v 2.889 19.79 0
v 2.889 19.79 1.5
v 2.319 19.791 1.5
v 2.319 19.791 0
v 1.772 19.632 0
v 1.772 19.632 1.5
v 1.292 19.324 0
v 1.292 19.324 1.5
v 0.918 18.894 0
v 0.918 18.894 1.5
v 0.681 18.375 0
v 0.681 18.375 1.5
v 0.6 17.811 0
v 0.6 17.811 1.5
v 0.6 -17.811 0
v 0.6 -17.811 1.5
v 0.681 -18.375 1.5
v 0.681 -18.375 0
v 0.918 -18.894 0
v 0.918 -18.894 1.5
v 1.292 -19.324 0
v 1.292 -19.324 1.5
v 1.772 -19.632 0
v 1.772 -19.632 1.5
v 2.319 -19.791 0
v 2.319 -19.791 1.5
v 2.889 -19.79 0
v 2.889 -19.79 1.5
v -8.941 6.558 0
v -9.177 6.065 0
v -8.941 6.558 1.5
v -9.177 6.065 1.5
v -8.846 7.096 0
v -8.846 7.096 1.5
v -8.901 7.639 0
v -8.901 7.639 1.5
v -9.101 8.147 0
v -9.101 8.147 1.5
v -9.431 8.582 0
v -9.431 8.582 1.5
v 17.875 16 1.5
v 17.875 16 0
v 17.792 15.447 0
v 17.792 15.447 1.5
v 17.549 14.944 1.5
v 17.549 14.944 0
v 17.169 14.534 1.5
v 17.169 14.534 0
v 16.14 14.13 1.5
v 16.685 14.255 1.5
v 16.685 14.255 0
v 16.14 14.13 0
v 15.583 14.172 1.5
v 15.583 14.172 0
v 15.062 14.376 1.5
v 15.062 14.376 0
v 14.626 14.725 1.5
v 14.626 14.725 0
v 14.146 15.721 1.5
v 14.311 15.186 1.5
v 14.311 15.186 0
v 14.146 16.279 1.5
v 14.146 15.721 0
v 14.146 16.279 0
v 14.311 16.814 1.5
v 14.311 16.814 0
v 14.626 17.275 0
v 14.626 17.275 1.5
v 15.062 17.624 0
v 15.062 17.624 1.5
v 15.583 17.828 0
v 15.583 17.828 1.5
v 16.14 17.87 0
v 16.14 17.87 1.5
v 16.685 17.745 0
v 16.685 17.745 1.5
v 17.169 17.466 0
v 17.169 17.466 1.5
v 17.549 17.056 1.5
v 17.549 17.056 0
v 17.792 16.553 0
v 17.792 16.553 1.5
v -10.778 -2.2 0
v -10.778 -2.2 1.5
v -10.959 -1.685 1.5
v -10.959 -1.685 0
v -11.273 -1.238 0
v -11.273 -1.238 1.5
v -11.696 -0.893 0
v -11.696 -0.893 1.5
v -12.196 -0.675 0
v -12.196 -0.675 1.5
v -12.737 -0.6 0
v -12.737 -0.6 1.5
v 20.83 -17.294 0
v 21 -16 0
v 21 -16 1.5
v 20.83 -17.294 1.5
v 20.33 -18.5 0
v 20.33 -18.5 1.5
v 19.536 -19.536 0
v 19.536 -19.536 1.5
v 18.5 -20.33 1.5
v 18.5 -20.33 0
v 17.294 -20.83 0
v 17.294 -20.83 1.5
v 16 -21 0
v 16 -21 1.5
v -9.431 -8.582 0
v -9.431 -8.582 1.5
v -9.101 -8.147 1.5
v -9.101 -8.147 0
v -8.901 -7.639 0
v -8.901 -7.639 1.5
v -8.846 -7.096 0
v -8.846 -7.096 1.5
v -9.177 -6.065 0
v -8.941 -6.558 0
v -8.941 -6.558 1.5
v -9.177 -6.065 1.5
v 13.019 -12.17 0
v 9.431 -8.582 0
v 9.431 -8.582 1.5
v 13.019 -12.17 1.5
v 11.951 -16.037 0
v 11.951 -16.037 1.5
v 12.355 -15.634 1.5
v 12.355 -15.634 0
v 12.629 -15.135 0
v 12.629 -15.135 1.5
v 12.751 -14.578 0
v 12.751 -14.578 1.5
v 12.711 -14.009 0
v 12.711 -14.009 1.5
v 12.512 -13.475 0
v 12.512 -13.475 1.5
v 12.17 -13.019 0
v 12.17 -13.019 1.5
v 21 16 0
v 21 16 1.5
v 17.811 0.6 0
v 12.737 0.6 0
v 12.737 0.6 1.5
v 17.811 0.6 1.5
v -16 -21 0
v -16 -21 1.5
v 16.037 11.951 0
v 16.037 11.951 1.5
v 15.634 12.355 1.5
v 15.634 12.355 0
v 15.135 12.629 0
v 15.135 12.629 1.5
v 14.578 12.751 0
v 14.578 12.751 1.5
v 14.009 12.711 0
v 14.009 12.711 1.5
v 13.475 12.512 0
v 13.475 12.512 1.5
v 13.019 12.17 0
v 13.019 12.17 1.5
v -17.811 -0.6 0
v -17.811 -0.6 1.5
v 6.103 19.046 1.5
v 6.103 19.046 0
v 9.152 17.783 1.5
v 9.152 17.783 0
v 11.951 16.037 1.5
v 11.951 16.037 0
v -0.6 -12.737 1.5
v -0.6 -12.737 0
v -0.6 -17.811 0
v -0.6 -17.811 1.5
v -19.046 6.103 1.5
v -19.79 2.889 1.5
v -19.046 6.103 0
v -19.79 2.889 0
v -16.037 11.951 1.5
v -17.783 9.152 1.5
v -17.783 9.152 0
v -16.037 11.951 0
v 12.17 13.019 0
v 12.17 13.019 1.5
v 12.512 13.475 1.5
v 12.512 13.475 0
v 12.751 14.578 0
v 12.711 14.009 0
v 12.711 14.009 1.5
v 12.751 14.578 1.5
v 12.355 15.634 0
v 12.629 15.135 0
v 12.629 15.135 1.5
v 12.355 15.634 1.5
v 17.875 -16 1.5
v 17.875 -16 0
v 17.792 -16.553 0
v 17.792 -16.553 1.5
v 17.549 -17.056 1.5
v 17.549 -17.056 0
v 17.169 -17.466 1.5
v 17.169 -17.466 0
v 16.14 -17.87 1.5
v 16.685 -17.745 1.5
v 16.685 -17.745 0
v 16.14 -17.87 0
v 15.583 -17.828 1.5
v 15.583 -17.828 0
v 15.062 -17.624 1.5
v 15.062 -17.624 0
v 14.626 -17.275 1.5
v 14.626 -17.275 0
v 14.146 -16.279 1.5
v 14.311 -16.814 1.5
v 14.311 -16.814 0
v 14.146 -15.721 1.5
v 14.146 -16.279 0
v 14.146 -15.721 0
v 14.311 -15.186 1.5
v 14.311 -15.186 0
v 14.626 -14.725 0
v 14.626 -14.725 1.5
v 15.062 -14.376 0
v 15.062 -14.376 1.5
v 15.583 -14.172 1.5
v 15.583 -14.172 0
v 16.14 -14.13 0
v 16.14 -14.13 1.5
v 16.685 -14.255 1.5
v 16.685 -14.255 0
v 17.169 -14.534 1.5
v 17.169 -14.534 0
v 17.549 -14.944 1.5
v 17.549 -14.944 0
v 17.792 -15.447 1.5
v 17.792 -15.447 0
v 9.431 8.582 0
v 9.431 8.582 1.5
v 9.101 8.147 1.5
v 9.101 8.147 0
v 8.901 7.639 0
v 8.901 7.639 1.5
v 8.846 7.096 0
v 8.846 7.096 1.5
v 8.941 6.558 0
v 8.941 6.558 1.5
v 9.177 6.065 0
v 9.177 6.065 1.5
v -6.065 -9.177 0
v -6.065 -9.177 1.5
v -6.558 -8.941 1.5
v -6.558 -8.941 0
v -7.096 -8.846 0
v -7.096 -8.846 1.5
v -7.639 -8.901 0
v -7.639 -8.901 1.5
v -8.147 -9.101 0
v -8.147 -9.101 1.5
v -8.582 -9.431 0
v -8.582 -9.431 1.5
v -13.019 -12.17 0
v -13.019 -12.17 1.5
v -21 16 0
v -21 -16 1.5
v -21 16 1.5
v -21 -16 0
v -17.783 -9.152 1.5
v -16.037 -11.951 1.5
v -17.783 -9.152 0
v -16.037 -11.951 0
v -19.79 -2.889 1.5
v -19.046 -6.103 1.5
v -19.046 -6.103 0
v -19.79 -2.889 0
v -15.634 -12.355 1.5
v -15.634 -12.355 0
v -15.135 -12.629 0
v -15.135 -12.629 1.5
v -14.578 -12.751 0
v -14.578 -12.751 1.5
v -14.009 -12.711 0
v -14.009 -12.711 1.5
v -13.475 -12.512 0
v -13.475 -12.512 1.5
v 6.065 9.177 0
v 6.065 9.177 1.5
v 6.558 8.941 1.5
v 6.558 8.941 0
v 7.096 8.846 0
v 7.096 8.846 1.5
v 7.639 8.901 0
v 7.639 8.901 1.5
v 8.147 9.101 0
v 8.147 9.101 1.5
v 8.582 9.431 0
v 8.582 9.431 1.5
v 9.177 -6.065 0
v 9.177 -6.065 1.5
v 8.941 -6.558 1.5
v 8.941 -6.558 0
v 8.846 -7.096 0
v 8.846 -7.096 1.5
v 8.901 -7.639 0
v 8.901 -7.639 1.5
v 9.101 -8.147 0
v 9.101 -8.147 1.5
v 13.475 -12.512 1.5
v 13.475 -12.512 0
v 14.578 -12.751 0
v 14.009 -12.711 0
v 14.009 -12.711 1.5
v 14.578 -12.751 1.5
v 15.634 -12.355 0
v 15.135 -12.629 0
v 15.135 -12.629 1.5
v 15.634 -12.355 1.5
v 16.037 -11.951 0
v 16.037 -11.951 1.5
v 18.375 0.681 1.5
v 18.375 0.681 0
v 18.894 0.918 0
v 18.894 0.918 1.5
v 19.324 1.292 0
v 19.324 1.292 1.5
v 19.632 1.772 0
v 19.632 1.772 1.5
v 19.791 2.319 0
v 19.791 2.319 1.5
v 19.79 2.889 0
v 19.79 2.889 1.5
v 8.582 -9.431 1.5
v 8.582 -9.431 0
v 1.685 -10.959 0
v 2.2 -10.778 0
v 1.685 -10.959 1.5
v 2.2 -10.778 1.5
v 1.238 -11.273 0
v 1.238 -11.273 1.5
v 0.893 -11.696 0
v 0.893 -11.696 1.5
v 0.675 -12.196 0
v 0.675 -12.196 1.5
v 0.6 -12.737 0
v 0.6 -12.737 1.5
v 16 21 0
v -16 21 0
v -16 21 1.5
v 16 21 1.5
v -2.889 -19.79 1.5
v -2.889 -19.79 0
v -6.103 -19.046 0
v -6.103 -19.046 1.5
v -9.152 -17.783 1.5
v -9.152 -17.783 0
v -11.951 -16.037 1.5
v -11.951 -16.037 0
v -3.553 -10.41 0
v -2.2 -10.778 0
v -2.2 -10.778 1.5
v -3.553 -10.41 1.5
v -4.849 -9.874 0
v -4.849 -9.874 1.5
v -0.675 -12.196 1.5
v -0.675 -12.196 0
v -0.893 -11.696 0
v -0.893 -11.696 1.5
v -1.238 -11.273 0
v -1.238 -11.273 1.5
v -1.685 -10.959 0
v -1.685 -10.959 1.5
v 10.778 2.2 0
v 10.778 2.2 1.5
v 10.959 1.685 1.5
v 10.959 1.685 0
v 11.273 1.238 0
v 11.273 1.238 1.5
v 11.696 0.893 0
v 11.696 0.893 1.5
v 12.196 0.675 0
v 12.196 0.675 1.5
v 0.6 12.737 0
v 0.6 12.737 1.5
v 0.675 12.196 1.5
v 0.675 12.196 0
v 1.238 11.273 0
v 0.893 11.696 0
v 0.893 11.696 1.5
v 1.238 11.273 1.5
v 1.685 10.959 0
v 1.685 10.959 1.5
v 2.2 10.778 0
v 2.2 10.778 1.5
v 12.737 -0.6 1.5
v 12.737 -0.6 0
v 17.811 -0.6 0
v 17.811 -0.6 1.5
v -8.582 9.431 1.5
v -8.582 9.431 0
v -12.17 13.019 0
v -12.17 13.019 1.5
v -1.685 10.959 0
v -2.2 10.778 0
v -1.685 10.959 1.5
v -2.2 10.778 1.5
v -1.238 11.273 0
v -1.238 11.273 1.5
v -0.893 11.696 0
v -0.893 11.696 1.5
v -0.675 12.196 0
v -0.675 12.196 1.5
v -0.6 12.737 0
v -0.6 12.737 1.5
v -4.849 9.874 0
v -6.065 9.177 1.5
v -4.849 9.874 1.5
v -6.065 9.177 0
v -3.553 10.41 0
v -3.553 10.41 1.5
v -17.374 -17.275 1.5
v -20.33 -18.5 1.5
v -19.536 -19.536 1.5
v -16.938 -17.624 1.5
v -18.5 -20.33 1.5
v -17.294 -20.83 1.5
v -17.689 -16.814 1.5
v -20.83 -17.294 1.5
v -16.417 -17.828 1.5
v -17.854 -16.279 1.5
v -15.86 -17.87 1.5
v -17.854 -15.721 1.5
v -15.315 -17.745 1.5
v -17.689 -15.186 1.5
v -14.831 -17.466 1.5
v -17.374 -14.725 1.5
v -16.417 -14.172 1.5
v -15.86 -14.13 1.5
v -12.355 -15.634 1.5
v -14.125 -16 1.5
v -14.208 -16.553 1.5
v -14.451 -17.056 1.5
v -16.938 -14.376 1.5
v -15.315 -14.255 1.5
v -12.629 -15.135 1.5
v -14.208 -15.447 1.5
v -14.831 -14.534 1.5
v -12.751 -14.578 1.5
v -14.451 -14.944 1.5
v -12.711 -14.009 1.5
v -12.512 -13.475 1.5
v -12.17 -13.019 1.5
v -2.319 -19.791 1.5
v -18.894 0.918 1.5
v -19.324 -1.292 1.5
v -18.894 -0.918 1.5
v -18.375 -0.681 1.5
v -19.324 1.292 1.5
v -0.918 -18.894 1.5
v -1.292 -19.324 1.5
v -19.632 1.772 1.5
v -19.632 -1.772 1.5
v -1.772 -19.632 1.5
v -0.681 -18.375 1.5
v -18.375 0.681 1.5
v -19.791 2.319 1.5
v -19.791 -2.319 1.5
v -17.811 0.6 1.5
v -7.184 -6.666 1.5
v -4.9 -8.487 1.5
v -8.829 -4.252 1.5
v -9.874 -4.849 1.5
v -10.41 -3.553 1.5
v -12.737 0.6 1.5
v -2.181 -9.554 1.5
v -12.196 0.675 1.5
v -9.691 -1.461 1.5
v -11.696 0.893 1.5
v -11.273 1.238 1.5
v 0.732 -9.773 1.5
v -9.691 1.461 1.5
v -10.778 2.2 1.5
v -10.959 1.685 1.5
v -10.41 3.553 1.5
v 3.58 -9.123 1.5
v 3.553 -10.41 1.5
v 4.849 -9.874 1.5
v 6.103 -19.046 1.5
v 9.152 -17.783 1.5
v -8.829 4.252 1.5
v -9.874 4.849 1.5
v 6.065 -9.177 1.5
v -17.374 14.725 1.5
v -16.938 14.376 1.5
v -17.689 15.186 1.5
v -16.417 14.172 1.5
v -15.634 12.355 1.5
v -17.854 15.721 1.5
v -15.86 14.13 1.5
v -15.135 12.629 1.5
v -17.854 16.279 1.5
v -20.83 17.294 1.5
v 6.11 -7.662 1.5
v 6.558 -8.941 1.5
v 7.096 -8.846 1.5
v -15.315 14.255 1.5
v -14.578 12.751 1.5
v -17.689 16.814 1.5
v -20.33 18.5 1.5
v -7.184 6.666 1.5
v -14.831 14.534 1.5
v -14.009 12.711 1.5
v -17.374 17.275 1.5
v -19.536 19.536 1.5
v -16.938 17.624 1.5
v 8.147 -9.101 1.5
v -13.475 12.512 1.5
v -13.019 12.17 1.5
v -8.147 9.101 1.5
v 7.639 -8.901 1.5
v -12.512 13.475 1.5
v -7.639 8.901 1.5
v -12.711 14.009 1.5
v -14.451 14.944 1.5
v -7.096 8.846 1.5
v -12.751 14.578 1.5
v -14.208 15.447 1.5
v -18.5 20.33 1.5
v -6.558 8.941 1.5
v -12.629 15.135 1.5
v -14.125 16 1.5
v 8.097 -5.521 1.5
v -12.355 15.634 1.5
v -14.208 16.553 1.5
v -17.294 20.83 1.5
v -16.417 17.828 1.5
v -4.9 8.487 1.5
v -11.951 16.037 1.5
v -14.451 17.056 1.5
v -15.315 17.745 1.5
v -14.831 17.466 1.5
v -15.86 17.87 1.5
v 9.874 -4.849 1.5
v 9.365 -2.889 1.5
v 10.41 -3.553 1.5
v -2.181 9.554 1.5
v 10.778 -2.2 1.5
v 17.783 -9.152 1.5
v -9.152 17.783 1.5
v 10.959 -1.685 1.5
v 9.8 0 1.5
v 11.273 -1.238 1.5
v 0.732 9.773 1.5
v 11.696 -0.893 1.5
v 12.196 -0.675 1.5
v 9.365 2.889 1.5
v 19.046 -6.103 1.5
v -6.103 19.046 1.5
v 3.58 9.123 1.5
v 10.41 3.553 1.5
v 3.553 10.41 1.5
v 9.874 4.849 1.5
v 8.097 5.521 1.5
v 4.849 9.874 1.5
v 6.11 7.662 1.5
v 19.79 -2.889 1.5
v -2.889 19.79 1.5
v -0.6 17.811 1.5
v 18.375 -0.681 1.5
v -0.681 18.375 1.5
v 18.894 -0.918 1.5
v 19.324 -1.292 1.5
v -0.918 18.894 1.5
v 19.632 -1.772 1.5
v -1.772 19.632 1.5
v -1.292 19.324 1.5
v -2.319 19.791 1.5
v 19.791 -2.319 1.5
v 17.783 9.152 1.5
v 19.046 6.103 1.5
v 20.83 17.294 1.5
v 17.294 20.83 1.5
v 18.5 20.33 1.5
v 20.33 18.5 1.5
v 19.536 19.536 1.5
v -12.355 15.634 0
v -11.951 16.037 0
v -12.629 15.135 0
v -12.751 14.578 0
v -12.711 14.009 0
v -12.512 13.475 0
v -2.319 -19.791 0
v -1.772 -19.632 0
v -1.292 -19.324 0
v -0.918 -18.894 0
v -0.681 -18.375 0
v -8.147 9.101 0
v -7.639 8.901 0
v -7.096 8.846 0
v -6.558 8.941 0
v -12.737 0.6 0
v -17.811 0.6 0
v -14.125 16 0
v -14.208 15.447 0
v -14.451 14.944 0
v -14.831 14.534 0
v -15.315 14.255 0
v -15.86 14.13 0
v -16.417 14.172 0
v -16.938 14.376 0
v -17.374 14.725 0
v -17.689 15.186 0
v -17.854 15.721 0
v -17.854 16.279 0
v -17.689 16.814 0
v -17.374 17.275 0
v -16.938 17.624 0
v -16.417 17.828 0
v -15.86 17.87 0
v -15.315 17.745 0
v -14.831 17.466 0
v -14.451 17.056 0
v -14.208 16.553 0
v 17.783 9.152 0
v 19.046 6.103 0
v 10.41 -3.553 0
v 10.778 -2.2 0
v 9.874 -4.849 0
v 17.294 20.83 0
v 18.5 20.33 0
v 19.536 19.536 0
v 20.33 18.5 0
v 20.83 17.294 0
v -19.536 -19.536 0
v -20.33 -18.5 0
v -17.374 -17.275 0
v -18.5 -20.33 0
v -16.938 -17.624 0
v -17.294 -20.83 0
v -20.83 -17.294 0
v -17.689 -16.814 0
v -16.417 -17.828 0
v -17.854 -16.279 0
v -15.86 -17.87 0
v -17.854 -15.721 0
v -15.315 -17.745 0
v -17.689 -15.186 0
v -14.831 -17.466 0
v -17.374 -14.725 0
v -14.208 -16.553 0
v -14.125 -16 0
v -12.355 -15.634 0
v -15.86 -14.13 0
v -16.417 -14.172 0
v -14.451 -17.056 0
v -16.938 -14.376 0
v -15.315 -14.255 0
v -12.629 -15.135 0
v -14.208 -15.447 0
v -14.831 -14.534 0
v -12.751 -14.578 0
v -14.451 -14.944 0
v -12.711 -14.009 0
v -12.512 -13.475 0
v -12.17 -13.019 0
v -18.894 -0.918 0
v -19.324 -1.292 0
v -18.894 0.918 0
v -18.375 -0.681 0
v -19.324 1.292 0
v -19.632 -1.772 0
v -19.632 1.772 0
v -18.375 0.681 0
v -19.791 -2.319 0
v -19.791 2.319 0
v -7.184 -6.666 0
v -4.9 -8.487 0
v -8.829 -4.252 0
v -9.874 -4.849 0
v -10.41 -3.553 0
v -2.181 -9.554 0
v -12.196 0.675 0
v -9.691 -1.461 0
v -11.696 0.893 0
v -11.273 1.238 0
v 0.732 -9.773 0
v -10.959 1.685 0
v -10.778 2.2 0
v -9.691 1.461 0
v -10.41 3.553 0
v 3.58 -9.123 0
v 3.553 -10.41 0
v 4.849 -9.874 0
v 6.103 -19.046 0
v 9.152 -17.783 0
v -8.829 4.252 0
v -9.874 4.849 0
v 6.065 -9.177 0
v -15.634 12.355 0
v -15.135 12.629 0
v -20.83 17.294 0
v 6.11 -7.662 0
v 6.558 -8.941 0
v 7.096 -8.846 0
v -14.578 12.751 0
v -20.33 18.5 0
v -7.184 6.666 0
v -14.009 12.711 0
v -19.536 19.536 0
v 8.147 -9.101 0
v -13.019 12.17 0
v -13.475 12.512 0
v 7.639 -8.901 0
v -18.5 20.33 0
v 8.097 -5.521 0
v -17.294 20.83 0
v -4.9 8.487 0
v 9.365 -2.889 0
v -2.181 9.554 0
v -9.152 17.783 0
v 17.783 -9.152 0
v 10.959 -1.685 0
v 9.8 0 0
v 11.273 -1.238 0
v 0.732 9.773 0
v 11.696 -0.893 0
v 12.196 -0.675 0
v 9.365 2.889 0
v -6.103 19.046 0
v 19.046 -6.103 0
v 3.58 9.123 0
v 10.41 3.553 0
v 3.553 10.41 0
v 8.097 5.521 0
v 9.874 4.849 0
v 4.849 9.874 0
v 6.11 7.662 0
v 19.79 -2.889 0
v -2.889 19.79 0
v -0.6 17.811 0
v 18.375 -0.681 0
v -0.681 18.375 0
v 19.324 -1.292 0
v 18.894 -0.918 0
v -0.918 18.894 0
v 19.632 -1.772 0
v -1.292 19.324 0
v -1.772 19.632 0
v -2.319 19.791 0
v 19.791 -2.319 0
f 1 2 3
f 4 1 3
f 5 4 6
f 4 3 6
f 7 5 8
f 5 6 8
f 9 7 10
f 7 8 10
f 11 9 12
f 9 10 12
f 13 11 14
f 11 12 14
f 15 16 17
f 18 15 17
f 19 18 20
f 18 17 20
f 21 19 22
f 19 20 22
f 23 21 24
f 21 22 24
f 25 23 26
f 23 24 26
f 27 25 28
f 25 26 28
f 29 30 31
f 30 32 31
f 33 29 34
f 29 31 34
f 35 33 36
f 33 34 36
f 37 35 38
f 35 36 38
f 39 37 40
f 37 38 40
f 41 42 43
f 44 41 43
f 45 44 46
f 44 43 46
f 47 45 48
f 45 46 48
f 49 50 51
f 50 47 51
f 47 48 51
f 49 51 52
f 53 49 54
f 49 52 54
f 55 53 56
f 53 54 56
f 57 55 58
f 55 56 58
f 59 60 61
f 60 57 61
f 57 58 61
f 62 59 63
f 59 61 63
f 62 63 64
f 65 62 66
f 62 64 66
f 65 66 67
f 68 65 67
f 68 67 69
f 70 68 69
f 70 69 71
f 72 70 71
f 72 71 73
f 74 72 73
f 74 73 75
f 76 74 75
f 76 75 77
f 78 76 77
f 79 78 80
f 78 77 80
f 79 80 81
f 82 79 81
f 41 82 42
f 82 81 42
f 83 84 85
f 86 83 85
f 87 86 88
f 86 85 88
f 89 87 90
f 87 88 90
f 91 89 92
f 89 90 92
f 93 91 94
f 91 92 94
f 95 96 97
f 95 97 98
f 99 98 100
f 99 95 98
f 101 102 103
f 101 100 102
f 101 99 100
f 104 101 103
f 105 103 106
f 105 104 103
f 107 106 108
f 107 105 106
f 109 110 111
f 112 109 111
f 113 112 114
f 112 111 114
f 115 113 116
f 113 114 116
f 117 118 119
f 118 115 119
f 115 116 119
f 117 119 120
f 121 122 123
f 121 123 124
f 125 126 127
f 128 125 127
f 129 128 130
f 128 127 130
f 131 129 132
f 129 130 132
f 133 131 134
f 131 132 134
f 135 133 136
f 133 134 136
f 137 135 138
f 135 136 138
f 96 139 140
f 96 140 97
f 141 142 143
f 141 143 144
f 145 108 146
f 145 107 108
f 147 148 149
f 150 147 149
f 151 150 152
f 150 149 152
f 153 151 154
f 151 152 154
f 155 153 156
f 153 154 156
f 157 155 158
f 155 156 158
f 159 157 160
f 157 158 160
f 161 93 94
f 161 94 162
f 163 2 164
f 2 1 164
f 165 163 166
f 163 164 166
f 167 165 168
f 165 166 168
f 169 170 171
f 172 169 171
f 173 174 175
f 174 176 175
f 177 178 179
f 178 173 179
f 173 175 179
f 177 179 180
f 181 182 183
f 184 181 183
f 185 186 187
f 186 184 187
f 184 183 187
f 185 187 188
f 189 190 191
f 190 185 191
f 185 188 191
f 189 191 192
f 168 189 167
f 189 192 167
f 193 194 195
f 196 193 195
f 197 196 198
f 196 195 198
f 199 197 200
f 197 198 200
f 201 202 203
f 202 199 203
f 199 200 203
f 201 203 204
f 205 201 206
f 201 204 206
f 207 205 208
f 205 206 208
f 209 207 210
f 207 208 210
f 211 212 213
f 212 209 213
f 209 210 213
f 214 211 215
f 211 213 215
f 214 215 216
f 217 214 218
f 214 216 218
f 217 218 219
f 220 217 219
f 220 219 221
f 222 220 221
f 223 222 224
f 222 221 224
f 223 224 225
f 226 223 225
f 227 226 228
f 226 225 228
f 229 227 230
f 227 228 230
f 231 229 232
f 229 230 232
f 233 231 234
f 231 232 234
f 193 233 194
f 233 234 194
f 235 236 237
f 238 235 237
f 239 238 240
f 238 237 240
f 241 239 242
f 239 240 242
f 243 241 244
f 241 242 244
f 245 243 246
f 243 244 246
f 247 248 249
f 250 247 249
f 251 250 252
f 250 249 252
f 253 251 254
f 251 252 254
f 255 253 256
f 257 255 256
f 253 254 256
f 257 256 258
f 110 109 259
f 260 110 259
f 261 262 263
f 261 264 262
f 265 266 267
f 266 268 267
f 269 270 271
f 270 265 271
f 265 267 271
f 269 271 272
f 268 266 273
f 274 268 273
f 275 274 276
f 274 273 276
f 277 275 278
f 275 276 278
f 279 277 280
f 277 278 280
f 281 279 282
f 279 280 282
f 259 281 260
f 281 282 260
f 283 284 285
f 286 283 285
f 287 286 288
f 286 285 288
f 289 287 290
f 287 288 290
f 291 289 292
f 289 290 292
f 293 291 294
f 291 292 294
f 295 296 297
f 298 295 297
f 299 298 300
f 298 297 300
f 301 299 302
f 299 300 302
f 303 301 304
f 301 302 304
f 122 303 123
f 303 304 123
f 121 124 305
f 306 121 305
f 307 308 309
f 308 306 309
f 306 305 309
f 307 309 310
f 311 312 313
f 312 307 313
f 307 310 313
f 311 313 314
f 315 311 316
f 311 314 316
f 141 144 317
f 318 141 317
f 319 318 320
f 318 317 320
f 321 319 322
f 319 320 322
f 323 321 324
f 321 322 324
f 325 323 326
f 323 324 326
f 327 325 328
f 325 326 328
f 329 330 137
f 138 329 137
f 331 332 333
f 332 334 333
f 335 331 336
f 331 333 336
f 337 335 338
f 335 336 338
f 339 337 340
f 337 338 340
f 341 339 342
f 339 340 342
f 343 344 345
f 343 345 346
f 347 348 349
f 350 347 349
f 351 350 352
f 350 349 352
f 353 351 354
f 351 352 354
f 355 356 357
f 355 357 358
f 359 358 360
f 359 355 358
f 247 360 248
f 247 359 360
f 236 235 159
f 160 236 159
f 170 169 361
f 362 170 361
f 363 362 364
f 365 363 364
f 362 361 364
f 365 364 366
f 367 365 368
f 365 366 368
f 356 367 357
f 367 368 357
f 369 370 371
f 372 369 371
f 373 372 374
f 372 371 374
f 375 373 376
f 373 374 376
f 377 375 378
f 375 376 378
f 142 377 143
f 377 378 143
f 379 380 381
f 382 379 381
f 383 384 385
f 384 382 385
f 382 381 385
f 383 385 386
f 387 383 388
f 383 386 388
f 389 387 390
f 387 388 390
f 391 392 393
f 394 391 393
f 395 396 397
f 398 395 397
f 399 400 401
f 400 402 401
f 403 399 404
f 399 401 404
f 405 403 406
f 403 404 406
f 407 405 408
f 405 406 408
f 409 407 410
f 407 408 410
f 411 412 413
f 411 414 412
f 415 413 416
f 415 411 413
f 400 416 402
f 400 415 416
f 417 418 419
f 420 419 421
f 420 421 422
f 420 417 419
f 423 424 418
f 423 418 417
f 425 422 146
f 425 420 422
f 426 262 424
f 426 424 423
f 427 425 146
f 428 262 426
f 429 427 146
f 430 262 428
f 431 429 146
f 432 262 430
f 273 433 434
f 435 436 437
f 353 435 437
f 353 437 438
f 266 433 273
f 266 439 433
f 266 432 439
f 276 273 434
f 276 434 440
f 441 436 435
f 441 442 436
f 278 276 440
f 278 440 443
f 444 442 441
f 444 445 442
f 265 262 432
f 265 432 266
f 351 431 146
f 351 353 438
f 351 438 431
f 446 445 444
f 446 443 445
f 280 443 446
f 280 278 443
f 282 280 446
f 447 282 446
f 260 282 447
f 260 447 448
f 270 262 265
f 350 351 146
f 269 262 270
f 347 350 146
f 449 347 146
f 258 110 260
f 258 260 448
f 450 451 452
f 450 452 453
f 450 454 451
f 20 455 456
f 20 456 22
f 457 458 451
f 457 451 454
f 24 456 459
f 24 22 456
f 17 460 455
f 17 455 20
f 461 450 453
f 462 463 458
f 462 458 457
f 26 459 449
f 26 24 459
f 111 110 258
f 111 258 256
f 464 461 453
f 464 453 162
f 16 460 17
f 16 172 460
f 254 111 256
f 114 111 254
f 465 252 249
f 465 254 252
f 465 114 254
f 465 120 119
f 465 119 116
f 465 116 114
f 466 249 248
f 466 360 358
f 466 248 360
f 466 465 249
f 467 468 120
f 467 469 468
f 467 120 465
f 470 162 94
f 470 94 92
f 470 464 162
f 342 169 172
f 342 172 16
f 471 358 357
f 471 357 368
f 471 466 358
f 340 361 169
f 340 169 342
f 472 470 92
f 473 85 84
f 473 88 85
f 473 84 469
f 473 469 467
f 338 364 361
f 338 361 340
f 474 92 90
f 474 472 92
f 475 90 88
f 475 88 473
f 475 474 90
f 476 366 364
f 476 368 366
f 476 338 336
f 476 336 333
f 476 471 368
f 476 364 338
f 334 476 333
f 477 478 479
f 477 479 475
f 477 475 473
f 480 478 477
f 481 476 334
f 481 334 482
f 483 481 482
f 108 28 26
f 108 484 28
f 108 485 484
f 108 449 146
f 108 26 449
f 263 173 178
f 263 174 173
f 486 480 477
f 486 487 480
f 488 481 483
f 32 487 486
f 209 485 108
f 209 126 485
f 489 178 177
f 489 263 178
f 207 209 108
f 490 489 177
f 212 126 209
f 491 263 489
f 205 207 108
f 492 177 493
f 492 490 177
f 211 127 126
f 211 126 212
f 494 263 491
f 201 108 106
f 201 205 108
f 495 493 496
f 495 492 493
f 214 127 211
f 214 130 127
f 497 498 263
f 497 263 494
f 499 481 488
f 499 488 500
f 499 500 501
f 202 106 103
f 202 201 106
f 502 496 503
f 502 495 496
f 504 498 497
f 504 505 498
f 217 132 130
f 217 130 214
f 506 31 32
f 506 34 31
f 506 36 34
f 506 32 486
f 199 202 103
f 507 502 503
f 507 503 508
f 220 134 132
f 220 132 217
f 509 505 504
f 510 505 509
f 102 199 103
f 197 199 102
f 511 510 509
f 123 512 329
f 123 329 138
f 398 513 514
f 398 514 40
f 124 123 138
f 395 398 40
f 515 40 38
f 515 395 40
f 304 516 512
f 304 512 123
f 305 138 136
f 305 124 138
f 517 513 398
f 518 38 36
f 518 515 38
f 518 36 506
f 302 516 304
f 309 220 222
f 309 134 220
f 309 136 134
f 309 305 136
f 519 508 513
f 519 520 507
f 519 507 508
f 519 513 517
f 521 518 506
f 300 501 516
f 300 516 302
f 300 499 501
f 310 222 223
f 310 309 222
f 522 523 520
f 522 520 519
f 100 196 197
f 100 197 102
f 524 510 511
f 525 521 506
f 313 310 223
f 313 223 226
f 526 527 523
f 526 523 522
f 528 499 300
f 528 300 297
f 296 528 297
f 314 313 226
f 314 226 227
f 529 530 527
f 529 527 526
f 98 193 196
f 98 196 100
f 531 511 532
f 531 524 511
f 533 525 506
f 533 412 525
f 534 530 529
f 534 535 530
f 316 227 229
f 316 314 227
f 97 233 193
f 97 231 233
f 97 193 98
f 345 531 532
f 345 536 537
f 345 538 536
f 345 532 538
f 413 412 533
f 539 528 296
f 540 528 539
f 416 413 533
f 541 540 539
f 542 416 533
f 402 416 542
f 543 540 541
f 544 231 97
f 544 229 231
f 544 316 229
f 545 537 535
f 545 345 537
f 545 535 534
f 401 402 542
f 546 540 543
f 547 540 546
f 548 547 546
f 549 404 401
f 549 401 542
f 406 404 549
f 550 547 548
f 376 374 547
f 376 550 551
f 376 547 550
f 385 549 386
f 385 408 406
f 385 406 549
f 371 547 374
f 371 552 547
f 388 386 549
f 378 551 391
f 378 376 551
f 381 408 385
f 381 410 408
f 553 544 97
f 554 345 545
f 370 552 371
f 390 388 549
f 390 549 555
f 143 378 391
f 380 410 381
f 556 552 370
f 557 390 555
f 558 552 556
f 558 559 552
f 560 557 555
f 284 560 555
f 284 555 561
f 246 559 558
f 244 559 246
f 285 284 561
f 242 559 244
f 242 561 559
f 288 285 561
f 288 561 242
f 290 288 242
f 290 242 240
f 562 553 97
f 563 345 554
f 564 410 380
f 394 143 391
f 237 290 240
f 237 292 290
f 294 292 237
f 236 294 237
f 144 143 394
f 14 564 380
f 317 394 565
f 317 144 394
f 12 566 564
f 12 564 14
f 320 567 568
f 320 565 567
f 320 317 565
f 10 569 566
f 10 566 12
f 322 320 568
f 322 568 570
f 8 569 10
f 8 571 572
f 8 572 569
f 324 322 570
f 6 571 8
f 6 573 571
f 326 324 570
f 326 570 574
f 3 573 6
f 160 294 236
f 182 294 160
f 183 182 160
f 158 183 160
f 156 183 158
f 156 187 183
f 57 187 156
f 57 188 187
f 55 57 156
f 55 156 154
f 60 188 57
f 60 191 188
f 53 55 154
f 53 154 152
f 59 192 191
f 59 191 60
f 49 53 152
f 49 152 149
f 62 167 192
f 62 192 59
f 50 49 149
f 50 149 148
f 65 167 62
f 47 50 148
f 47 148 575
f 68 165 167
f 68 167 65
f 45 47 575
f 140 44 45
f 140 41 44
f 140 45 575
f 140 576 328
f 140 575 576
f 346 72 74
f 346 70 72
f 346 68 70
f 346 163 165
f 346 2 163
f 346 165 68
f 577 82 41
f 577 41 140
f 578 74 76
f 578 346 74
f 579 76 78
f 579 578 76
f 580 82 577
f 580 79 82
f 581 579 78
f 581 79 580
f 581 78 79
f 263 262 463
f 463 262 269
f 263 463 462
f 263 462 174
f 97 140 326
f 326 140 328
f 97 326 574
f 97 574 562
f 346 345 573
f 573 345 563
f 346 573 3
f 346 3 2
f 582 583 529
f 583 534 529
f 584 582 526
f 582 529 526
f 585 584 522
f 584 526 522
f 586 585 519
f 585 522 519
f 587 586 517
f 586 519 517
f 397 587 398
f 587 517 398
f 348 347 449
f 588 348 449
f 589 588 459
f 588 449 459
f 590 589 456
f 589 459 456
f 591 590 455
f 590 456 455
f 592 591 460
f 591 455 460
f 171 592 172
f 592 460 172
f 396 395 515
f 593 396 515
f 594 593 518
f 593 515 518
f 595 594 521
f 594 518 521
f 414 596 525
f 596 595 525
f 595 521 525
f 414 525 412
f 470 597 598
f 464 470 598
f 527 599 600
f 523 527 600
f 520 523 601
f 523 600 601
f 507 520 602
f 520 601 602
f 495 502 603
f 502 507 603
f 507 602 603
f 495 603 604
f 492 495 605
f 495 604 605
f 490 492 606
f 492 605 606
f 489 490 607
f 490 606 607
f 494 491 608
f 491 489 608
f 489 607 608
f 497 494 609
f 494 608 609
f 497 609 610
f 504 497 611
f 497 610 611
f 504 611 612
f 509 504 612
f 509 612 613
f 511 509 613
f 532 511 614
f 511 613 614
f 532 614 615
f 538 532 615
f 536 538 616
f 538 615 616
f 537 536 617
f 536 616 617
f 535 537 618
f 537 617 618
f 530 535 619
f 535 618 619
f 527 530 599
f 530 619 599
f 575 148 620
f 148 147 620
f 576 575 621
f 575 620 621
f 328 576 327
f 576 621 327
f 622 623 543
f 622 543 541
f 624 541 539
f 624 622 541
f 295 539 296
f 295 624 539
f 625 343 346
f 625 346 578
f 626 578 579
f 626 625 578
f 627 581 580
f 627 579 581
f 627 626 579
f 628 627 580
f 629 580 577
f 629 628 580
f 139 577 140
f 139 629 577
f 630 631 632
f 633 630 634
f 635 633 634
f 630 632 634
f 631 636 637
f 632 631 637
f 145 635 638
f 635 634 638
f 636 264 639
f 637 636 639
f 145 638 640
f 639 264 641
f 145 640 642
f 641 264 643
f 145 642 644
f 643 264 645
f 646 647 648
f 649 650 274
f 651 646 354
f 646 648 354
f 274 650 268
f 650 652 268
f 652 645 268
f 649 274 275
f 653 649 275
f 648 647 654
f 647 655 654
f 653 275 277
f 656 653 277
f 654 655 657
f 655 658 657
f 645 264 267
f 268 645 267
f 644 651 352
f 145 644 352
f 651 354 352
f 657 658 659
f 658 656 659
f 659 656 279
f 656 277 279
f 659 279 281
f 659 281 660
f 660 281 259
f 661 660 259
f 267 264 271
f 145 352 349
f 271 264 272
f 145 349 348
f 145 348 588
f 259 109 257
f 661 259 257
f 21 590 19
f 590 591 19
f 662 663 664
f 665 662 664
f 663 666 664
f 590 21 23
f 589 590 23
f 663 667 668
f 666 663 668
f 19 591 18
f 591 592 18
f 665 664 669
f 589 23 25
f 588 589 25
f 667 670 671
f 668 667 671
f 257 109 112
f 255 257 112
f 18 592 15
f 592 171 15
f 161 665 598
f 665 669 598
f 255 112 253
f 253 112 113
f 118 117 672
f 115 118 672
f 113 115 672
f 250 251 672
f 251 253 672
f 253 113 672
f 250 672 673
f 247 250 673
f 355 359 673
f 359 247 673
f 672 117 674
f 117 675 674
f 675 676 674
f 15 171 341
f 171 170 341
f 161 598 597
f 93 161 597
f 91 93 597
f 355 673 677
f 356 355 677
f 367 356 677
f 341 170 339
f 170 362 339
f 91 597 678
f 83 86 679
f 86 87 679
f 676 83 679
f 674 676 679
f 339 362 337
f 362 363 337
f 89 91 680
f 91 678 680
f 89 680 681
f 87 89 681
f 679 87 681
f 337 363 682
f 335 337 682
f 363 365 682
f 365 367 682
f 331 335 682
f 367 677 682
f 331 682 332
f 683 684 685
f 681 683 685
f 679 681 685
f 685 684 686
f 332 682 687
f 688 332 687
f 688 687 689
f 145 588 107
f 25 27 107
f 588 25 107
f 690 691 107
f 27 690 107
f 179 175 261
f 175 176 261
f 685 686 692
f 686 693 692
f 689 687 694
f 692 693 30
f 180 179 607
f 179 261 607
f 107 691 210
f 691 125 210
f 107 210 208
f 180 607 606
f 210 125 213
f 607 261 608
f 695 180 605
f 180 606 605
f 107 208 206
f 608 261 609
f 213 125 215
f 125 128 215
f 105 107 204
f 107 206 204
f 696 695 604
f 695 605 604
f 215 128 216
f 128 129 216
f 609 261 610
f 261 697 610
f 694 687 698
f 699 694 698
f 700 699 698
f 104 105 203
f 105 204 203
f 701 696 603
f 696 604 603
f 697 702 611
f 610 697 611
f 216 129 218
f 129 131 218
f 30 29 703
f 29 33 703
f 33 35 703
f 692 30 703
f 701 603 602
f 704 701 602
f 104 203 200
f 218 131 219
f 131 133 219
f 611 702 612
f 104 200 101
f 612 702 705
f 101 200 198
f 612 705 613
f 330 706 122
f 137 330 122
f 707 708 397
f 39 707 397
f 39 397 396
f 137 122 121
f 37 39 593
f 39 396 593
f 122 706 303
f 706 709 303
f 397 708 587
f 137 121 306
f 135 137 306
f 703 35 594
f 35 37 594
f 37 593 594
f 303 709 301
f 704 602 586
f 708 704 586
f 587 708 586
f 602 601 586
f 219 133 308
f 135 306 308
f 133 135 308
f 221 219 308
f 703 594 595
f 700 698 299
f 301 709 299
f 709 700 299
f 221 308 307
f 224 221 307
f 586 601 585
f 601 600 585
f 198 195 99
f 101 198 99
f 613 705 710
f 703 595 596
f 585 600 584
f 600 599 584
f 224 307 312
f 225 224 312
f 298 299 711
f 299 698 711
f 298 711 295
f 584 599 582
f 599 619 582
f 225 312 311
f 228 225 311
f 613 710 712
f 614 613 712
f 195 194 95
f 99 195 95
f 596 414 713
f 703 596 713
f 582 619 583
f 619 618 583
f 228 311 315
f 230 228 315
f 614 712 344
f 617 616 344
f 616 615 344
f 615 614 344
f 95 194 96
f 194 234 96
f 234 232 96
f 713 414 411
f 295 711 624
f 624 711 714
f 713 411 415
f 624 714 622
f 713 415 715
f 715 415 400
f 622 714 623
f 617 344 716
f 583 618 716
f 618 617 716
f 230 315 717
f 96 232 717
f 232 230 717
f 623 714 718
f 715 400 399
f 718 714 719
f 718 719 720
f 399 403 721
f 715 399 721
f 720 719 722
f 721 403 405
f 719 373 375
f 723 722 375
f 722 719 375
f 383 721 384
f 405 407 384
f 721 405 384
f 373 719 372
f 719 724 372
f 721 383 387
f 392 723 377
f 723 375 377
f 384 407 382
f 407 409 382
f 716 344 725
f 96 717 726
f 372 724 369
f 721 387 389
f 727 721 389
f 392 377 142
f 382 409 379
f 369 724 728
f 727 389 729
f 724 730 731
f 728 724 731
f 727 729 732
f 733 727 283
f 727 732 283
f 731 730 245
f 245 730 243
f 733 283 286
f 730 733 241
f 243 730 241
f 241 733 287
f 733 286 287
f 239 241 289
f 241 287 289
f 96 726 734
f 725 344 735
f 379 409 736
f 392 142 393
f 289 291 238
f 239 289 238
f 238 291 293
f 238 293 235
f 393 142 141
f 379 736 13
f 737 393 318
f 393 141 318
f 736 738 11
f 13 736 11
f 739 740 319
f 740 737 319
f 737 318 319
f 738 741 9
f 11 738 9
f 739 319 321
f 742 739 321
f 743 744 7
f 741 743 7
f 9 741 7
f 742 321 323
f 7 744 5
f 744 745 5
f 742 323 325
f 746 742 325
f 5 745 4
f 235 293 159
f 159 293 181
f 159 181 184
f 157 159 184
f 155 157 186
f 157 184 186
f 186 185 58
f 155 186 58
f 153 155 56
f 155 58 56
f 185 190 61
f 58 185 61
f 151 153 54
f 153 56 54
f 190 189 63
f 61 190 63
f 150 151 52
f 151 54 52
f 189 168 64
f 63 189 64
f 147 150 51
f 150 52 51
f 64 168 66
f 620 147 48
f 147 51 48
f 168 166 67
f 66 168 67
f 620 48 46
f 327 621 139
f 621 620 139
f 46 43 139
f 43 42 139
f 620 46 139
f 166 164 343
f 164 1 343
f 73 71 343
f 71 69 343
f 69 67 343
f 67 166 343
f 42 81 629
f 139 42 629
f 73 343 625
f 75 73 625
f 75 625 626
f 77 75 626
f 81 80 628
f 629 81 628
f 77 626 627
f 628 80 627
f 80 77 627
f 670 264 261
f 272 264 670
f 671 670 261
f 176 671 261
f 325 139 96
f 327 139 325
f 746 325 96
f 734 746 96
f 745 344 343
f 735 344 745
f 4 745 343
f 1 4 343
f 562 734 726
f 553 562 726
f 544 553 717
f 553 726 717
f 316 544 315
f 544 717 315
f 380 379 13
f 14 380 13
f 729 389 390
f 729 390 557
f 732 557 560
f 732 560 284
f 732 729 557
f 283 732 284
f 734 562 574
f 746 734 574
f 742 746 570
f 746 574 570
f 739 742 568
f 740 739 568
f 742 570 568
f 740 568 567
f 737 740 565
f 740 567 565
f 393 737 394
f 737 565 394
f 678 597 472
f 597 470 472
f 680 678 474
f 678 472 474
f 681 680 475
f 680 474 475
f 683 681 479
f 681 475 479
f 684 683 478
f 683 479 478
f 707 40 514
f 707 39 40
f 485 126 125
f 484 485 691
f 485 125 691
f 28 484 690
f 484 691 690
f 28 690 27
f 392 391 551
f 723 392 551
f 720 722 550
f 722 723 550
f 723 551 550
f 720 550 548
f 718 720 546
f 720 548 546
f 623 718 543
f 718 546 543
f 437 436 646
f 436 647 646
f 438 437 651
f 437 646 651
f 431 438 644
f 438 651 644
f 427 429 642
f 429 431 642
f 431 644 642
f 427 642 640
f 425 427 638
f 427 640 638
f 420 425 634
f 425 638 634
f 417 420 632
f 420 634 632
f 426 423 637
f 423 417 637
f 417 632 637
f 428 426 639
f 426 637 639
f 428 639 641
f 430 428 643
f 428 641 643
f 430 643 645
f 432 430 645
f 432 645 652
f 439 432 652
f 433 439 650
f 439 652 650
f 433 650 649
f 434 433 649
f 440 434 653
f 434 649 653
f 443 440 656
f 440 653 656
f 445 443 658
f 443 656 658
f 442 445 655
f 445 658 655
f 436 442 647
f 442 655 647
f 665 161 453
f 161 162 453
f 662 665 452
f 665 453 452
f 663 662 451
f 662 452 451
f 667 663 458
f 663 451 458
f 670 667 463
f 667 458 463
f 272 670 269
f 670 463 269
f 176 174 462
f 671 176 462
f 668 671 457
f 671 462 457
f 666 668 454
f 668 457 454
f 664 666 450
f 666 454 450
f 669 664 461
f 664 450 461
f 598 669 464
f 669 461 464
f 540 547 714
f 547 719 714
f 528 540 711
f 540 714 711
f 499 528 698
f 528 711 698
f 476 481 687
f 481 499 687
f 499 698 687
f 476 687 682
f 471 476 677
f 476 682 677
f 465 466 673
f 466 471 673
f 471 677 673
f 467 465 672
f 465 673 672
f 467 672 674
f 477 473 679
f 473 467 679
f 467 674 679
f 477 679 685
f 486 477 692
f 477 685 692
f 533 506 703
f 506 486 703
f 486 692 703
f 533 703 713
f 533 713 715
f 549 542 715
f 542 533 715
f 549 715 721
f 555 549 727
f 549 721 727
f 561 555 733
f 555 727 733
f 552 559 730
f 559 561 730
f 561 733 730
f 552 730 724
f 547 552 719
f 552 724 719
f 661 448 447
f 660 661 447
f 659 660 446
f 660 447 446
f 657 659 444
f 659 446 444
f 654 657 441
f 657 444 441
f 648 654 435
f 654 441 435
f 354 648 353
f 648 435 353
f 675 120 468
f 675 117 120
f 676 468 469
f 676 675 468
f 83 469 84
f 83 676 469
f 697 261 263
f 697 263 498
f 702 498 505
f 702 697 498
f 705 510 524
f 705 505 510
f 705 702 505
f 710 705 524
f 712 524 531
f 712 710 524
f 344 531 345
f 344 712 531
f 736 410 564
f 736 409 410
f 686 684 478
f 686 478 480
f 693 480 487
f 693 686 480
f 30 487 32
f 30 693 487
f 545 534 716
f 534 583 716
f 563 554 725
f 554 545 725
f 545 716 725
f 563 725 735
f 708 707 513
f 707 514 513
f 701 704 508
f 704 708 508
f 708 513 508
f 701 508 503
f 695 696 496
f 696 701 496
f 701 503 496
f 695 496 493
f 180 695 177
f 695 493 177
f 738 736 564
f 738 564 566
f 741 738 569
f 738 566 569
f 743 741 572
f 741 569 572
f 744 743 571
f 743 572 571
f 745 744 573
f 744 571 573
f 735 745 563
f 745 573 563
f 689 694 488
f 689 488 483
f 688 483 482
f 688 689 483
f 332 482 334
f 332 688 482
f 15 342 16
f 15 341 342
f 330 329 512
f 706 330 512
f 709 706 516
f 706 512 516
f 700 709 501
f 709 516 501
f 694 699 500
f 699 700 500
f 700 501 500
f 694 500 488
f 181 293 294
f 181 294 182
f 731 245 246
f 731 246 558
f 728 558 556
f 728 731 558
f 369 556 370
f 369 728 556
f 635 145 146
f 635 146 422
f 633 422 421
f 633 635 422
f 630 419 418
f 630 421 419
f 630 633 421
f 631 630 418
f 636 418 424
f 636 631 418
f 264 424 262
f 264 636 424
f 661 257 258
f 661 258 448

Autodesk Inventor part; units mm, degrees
ref_plane "YZ Plane" through (0, 0, 0) normal (1, 0, 0) x (0, 1, 0)
ref_plane "XZ Plane" through (0, 0, 0) normal (0, 1, 0) x (-1, 0, 0)
ref_plane "XY Plane" through (0, 0, 0) normal (0, 0, 1) x (1, 0, 0)
sketch "Sketch1" plane through (0, 0, 0) normal (0, 0, 1) x (1, 0, 0)
  line L0 (-16, 21) -> (16, 21)
  line L1 (21, 16) -> (21, -16)
  line L2 (16, -21) -> (-16, -21)
  line L3 (-21, -16) -> (-21, 16)
  circle A0 centre (-16, -16) radius 1.875
  circle A1 centre (-16, 16) radius 1.875
  circle A2 centre (16, 16) radius 1.875
  circle A3 centre (16, -16) radius 1.875
  circle A4 centre (0, 0) radius 20
  arc A5 (-16, 21) -> (-21, 16) centre (-16, 16) ccw
  arc A6 (21, 16) -> (16, 21) centre (16, 16) ccw
  arc A7 (16, -21) -> (21, -16) centre (16, -16) ccw
  arc A8 (-21, -16) -> (-16, -21) centre (-16, -16) ccw
  circle A9 centre (0, 0) radius 11
  circle A10 centre (0, 0) radius 9.8
  line L4 (-0.6, -10.9836) -> (-0.6, -19.991)
  line L5 (0.6, -10.9836) -> (0.6, -19.991)
  point P0 (21, -21)
  point P1 (21, 21)
  point P2 (-21, -21)
  dimension "d0" = 42
  dimension "d1" = 42
  dimension "d2" = 3.75
  dimension "d3" = 3.75
  dimension "d4" = 3.75
  dimension "d5" = 3.75
  dimension "d6" = 40
  dimension "d7" = 32
  dimension "d8" = 32
  dimension "d9" = 5
  dimension "d11" = 5
  dimension "d12" = 5
  dimension "d13" = 5
  dimension "d14" = 5
  dimension "d15" = 5
  dimension "d16" = 21
  dimension "d17" = 21
  dimension "d18" = 5
  dimension "d19" = 5
  dimension "d20" = 22
  dimension "d21" = 19.6
  dimension "d22" = 1.2
  dimension "d23" = 0.6
  dimension "d44" = 0
  dimension "d45" = 0
extrude "Base" add sketch "Sketch1" along normal blind 1.5 contours L0 A6 L1 A7 L2 A8 L3 A5 | A9
extrude "Support" add sketch "Sketch1" along normal blind 1.5 contours L4 A9 L5 A4 picked at (0.4667, -13.9909)
fillet "Fillet1" radius 2 4 edges at (-0.6, -10.9836, 0.75) (0.6, -10.9836, 0.75) (0.6, -19.991, 0.75) (-0.6, -19.991, 0.75)
pattern_circular "Support pattern" count 8 over 360 about axis through (0, 0, -10) along (0, 0, 1) of "Support", "Fillet1"
equation "\"d3\" = d2"
equation "\"d4\" = d2"
equation "\"d5\" = d2"
equation "\"d9\" = d13"
equation "\"d12\" = d11"
equation "\"d16\" = 0.5 * d0"
equation "\"d17\" = 0.5 * d0"
equation "\"d23\" = 0.5 * d22"
properties part number "40mm fan grill"
